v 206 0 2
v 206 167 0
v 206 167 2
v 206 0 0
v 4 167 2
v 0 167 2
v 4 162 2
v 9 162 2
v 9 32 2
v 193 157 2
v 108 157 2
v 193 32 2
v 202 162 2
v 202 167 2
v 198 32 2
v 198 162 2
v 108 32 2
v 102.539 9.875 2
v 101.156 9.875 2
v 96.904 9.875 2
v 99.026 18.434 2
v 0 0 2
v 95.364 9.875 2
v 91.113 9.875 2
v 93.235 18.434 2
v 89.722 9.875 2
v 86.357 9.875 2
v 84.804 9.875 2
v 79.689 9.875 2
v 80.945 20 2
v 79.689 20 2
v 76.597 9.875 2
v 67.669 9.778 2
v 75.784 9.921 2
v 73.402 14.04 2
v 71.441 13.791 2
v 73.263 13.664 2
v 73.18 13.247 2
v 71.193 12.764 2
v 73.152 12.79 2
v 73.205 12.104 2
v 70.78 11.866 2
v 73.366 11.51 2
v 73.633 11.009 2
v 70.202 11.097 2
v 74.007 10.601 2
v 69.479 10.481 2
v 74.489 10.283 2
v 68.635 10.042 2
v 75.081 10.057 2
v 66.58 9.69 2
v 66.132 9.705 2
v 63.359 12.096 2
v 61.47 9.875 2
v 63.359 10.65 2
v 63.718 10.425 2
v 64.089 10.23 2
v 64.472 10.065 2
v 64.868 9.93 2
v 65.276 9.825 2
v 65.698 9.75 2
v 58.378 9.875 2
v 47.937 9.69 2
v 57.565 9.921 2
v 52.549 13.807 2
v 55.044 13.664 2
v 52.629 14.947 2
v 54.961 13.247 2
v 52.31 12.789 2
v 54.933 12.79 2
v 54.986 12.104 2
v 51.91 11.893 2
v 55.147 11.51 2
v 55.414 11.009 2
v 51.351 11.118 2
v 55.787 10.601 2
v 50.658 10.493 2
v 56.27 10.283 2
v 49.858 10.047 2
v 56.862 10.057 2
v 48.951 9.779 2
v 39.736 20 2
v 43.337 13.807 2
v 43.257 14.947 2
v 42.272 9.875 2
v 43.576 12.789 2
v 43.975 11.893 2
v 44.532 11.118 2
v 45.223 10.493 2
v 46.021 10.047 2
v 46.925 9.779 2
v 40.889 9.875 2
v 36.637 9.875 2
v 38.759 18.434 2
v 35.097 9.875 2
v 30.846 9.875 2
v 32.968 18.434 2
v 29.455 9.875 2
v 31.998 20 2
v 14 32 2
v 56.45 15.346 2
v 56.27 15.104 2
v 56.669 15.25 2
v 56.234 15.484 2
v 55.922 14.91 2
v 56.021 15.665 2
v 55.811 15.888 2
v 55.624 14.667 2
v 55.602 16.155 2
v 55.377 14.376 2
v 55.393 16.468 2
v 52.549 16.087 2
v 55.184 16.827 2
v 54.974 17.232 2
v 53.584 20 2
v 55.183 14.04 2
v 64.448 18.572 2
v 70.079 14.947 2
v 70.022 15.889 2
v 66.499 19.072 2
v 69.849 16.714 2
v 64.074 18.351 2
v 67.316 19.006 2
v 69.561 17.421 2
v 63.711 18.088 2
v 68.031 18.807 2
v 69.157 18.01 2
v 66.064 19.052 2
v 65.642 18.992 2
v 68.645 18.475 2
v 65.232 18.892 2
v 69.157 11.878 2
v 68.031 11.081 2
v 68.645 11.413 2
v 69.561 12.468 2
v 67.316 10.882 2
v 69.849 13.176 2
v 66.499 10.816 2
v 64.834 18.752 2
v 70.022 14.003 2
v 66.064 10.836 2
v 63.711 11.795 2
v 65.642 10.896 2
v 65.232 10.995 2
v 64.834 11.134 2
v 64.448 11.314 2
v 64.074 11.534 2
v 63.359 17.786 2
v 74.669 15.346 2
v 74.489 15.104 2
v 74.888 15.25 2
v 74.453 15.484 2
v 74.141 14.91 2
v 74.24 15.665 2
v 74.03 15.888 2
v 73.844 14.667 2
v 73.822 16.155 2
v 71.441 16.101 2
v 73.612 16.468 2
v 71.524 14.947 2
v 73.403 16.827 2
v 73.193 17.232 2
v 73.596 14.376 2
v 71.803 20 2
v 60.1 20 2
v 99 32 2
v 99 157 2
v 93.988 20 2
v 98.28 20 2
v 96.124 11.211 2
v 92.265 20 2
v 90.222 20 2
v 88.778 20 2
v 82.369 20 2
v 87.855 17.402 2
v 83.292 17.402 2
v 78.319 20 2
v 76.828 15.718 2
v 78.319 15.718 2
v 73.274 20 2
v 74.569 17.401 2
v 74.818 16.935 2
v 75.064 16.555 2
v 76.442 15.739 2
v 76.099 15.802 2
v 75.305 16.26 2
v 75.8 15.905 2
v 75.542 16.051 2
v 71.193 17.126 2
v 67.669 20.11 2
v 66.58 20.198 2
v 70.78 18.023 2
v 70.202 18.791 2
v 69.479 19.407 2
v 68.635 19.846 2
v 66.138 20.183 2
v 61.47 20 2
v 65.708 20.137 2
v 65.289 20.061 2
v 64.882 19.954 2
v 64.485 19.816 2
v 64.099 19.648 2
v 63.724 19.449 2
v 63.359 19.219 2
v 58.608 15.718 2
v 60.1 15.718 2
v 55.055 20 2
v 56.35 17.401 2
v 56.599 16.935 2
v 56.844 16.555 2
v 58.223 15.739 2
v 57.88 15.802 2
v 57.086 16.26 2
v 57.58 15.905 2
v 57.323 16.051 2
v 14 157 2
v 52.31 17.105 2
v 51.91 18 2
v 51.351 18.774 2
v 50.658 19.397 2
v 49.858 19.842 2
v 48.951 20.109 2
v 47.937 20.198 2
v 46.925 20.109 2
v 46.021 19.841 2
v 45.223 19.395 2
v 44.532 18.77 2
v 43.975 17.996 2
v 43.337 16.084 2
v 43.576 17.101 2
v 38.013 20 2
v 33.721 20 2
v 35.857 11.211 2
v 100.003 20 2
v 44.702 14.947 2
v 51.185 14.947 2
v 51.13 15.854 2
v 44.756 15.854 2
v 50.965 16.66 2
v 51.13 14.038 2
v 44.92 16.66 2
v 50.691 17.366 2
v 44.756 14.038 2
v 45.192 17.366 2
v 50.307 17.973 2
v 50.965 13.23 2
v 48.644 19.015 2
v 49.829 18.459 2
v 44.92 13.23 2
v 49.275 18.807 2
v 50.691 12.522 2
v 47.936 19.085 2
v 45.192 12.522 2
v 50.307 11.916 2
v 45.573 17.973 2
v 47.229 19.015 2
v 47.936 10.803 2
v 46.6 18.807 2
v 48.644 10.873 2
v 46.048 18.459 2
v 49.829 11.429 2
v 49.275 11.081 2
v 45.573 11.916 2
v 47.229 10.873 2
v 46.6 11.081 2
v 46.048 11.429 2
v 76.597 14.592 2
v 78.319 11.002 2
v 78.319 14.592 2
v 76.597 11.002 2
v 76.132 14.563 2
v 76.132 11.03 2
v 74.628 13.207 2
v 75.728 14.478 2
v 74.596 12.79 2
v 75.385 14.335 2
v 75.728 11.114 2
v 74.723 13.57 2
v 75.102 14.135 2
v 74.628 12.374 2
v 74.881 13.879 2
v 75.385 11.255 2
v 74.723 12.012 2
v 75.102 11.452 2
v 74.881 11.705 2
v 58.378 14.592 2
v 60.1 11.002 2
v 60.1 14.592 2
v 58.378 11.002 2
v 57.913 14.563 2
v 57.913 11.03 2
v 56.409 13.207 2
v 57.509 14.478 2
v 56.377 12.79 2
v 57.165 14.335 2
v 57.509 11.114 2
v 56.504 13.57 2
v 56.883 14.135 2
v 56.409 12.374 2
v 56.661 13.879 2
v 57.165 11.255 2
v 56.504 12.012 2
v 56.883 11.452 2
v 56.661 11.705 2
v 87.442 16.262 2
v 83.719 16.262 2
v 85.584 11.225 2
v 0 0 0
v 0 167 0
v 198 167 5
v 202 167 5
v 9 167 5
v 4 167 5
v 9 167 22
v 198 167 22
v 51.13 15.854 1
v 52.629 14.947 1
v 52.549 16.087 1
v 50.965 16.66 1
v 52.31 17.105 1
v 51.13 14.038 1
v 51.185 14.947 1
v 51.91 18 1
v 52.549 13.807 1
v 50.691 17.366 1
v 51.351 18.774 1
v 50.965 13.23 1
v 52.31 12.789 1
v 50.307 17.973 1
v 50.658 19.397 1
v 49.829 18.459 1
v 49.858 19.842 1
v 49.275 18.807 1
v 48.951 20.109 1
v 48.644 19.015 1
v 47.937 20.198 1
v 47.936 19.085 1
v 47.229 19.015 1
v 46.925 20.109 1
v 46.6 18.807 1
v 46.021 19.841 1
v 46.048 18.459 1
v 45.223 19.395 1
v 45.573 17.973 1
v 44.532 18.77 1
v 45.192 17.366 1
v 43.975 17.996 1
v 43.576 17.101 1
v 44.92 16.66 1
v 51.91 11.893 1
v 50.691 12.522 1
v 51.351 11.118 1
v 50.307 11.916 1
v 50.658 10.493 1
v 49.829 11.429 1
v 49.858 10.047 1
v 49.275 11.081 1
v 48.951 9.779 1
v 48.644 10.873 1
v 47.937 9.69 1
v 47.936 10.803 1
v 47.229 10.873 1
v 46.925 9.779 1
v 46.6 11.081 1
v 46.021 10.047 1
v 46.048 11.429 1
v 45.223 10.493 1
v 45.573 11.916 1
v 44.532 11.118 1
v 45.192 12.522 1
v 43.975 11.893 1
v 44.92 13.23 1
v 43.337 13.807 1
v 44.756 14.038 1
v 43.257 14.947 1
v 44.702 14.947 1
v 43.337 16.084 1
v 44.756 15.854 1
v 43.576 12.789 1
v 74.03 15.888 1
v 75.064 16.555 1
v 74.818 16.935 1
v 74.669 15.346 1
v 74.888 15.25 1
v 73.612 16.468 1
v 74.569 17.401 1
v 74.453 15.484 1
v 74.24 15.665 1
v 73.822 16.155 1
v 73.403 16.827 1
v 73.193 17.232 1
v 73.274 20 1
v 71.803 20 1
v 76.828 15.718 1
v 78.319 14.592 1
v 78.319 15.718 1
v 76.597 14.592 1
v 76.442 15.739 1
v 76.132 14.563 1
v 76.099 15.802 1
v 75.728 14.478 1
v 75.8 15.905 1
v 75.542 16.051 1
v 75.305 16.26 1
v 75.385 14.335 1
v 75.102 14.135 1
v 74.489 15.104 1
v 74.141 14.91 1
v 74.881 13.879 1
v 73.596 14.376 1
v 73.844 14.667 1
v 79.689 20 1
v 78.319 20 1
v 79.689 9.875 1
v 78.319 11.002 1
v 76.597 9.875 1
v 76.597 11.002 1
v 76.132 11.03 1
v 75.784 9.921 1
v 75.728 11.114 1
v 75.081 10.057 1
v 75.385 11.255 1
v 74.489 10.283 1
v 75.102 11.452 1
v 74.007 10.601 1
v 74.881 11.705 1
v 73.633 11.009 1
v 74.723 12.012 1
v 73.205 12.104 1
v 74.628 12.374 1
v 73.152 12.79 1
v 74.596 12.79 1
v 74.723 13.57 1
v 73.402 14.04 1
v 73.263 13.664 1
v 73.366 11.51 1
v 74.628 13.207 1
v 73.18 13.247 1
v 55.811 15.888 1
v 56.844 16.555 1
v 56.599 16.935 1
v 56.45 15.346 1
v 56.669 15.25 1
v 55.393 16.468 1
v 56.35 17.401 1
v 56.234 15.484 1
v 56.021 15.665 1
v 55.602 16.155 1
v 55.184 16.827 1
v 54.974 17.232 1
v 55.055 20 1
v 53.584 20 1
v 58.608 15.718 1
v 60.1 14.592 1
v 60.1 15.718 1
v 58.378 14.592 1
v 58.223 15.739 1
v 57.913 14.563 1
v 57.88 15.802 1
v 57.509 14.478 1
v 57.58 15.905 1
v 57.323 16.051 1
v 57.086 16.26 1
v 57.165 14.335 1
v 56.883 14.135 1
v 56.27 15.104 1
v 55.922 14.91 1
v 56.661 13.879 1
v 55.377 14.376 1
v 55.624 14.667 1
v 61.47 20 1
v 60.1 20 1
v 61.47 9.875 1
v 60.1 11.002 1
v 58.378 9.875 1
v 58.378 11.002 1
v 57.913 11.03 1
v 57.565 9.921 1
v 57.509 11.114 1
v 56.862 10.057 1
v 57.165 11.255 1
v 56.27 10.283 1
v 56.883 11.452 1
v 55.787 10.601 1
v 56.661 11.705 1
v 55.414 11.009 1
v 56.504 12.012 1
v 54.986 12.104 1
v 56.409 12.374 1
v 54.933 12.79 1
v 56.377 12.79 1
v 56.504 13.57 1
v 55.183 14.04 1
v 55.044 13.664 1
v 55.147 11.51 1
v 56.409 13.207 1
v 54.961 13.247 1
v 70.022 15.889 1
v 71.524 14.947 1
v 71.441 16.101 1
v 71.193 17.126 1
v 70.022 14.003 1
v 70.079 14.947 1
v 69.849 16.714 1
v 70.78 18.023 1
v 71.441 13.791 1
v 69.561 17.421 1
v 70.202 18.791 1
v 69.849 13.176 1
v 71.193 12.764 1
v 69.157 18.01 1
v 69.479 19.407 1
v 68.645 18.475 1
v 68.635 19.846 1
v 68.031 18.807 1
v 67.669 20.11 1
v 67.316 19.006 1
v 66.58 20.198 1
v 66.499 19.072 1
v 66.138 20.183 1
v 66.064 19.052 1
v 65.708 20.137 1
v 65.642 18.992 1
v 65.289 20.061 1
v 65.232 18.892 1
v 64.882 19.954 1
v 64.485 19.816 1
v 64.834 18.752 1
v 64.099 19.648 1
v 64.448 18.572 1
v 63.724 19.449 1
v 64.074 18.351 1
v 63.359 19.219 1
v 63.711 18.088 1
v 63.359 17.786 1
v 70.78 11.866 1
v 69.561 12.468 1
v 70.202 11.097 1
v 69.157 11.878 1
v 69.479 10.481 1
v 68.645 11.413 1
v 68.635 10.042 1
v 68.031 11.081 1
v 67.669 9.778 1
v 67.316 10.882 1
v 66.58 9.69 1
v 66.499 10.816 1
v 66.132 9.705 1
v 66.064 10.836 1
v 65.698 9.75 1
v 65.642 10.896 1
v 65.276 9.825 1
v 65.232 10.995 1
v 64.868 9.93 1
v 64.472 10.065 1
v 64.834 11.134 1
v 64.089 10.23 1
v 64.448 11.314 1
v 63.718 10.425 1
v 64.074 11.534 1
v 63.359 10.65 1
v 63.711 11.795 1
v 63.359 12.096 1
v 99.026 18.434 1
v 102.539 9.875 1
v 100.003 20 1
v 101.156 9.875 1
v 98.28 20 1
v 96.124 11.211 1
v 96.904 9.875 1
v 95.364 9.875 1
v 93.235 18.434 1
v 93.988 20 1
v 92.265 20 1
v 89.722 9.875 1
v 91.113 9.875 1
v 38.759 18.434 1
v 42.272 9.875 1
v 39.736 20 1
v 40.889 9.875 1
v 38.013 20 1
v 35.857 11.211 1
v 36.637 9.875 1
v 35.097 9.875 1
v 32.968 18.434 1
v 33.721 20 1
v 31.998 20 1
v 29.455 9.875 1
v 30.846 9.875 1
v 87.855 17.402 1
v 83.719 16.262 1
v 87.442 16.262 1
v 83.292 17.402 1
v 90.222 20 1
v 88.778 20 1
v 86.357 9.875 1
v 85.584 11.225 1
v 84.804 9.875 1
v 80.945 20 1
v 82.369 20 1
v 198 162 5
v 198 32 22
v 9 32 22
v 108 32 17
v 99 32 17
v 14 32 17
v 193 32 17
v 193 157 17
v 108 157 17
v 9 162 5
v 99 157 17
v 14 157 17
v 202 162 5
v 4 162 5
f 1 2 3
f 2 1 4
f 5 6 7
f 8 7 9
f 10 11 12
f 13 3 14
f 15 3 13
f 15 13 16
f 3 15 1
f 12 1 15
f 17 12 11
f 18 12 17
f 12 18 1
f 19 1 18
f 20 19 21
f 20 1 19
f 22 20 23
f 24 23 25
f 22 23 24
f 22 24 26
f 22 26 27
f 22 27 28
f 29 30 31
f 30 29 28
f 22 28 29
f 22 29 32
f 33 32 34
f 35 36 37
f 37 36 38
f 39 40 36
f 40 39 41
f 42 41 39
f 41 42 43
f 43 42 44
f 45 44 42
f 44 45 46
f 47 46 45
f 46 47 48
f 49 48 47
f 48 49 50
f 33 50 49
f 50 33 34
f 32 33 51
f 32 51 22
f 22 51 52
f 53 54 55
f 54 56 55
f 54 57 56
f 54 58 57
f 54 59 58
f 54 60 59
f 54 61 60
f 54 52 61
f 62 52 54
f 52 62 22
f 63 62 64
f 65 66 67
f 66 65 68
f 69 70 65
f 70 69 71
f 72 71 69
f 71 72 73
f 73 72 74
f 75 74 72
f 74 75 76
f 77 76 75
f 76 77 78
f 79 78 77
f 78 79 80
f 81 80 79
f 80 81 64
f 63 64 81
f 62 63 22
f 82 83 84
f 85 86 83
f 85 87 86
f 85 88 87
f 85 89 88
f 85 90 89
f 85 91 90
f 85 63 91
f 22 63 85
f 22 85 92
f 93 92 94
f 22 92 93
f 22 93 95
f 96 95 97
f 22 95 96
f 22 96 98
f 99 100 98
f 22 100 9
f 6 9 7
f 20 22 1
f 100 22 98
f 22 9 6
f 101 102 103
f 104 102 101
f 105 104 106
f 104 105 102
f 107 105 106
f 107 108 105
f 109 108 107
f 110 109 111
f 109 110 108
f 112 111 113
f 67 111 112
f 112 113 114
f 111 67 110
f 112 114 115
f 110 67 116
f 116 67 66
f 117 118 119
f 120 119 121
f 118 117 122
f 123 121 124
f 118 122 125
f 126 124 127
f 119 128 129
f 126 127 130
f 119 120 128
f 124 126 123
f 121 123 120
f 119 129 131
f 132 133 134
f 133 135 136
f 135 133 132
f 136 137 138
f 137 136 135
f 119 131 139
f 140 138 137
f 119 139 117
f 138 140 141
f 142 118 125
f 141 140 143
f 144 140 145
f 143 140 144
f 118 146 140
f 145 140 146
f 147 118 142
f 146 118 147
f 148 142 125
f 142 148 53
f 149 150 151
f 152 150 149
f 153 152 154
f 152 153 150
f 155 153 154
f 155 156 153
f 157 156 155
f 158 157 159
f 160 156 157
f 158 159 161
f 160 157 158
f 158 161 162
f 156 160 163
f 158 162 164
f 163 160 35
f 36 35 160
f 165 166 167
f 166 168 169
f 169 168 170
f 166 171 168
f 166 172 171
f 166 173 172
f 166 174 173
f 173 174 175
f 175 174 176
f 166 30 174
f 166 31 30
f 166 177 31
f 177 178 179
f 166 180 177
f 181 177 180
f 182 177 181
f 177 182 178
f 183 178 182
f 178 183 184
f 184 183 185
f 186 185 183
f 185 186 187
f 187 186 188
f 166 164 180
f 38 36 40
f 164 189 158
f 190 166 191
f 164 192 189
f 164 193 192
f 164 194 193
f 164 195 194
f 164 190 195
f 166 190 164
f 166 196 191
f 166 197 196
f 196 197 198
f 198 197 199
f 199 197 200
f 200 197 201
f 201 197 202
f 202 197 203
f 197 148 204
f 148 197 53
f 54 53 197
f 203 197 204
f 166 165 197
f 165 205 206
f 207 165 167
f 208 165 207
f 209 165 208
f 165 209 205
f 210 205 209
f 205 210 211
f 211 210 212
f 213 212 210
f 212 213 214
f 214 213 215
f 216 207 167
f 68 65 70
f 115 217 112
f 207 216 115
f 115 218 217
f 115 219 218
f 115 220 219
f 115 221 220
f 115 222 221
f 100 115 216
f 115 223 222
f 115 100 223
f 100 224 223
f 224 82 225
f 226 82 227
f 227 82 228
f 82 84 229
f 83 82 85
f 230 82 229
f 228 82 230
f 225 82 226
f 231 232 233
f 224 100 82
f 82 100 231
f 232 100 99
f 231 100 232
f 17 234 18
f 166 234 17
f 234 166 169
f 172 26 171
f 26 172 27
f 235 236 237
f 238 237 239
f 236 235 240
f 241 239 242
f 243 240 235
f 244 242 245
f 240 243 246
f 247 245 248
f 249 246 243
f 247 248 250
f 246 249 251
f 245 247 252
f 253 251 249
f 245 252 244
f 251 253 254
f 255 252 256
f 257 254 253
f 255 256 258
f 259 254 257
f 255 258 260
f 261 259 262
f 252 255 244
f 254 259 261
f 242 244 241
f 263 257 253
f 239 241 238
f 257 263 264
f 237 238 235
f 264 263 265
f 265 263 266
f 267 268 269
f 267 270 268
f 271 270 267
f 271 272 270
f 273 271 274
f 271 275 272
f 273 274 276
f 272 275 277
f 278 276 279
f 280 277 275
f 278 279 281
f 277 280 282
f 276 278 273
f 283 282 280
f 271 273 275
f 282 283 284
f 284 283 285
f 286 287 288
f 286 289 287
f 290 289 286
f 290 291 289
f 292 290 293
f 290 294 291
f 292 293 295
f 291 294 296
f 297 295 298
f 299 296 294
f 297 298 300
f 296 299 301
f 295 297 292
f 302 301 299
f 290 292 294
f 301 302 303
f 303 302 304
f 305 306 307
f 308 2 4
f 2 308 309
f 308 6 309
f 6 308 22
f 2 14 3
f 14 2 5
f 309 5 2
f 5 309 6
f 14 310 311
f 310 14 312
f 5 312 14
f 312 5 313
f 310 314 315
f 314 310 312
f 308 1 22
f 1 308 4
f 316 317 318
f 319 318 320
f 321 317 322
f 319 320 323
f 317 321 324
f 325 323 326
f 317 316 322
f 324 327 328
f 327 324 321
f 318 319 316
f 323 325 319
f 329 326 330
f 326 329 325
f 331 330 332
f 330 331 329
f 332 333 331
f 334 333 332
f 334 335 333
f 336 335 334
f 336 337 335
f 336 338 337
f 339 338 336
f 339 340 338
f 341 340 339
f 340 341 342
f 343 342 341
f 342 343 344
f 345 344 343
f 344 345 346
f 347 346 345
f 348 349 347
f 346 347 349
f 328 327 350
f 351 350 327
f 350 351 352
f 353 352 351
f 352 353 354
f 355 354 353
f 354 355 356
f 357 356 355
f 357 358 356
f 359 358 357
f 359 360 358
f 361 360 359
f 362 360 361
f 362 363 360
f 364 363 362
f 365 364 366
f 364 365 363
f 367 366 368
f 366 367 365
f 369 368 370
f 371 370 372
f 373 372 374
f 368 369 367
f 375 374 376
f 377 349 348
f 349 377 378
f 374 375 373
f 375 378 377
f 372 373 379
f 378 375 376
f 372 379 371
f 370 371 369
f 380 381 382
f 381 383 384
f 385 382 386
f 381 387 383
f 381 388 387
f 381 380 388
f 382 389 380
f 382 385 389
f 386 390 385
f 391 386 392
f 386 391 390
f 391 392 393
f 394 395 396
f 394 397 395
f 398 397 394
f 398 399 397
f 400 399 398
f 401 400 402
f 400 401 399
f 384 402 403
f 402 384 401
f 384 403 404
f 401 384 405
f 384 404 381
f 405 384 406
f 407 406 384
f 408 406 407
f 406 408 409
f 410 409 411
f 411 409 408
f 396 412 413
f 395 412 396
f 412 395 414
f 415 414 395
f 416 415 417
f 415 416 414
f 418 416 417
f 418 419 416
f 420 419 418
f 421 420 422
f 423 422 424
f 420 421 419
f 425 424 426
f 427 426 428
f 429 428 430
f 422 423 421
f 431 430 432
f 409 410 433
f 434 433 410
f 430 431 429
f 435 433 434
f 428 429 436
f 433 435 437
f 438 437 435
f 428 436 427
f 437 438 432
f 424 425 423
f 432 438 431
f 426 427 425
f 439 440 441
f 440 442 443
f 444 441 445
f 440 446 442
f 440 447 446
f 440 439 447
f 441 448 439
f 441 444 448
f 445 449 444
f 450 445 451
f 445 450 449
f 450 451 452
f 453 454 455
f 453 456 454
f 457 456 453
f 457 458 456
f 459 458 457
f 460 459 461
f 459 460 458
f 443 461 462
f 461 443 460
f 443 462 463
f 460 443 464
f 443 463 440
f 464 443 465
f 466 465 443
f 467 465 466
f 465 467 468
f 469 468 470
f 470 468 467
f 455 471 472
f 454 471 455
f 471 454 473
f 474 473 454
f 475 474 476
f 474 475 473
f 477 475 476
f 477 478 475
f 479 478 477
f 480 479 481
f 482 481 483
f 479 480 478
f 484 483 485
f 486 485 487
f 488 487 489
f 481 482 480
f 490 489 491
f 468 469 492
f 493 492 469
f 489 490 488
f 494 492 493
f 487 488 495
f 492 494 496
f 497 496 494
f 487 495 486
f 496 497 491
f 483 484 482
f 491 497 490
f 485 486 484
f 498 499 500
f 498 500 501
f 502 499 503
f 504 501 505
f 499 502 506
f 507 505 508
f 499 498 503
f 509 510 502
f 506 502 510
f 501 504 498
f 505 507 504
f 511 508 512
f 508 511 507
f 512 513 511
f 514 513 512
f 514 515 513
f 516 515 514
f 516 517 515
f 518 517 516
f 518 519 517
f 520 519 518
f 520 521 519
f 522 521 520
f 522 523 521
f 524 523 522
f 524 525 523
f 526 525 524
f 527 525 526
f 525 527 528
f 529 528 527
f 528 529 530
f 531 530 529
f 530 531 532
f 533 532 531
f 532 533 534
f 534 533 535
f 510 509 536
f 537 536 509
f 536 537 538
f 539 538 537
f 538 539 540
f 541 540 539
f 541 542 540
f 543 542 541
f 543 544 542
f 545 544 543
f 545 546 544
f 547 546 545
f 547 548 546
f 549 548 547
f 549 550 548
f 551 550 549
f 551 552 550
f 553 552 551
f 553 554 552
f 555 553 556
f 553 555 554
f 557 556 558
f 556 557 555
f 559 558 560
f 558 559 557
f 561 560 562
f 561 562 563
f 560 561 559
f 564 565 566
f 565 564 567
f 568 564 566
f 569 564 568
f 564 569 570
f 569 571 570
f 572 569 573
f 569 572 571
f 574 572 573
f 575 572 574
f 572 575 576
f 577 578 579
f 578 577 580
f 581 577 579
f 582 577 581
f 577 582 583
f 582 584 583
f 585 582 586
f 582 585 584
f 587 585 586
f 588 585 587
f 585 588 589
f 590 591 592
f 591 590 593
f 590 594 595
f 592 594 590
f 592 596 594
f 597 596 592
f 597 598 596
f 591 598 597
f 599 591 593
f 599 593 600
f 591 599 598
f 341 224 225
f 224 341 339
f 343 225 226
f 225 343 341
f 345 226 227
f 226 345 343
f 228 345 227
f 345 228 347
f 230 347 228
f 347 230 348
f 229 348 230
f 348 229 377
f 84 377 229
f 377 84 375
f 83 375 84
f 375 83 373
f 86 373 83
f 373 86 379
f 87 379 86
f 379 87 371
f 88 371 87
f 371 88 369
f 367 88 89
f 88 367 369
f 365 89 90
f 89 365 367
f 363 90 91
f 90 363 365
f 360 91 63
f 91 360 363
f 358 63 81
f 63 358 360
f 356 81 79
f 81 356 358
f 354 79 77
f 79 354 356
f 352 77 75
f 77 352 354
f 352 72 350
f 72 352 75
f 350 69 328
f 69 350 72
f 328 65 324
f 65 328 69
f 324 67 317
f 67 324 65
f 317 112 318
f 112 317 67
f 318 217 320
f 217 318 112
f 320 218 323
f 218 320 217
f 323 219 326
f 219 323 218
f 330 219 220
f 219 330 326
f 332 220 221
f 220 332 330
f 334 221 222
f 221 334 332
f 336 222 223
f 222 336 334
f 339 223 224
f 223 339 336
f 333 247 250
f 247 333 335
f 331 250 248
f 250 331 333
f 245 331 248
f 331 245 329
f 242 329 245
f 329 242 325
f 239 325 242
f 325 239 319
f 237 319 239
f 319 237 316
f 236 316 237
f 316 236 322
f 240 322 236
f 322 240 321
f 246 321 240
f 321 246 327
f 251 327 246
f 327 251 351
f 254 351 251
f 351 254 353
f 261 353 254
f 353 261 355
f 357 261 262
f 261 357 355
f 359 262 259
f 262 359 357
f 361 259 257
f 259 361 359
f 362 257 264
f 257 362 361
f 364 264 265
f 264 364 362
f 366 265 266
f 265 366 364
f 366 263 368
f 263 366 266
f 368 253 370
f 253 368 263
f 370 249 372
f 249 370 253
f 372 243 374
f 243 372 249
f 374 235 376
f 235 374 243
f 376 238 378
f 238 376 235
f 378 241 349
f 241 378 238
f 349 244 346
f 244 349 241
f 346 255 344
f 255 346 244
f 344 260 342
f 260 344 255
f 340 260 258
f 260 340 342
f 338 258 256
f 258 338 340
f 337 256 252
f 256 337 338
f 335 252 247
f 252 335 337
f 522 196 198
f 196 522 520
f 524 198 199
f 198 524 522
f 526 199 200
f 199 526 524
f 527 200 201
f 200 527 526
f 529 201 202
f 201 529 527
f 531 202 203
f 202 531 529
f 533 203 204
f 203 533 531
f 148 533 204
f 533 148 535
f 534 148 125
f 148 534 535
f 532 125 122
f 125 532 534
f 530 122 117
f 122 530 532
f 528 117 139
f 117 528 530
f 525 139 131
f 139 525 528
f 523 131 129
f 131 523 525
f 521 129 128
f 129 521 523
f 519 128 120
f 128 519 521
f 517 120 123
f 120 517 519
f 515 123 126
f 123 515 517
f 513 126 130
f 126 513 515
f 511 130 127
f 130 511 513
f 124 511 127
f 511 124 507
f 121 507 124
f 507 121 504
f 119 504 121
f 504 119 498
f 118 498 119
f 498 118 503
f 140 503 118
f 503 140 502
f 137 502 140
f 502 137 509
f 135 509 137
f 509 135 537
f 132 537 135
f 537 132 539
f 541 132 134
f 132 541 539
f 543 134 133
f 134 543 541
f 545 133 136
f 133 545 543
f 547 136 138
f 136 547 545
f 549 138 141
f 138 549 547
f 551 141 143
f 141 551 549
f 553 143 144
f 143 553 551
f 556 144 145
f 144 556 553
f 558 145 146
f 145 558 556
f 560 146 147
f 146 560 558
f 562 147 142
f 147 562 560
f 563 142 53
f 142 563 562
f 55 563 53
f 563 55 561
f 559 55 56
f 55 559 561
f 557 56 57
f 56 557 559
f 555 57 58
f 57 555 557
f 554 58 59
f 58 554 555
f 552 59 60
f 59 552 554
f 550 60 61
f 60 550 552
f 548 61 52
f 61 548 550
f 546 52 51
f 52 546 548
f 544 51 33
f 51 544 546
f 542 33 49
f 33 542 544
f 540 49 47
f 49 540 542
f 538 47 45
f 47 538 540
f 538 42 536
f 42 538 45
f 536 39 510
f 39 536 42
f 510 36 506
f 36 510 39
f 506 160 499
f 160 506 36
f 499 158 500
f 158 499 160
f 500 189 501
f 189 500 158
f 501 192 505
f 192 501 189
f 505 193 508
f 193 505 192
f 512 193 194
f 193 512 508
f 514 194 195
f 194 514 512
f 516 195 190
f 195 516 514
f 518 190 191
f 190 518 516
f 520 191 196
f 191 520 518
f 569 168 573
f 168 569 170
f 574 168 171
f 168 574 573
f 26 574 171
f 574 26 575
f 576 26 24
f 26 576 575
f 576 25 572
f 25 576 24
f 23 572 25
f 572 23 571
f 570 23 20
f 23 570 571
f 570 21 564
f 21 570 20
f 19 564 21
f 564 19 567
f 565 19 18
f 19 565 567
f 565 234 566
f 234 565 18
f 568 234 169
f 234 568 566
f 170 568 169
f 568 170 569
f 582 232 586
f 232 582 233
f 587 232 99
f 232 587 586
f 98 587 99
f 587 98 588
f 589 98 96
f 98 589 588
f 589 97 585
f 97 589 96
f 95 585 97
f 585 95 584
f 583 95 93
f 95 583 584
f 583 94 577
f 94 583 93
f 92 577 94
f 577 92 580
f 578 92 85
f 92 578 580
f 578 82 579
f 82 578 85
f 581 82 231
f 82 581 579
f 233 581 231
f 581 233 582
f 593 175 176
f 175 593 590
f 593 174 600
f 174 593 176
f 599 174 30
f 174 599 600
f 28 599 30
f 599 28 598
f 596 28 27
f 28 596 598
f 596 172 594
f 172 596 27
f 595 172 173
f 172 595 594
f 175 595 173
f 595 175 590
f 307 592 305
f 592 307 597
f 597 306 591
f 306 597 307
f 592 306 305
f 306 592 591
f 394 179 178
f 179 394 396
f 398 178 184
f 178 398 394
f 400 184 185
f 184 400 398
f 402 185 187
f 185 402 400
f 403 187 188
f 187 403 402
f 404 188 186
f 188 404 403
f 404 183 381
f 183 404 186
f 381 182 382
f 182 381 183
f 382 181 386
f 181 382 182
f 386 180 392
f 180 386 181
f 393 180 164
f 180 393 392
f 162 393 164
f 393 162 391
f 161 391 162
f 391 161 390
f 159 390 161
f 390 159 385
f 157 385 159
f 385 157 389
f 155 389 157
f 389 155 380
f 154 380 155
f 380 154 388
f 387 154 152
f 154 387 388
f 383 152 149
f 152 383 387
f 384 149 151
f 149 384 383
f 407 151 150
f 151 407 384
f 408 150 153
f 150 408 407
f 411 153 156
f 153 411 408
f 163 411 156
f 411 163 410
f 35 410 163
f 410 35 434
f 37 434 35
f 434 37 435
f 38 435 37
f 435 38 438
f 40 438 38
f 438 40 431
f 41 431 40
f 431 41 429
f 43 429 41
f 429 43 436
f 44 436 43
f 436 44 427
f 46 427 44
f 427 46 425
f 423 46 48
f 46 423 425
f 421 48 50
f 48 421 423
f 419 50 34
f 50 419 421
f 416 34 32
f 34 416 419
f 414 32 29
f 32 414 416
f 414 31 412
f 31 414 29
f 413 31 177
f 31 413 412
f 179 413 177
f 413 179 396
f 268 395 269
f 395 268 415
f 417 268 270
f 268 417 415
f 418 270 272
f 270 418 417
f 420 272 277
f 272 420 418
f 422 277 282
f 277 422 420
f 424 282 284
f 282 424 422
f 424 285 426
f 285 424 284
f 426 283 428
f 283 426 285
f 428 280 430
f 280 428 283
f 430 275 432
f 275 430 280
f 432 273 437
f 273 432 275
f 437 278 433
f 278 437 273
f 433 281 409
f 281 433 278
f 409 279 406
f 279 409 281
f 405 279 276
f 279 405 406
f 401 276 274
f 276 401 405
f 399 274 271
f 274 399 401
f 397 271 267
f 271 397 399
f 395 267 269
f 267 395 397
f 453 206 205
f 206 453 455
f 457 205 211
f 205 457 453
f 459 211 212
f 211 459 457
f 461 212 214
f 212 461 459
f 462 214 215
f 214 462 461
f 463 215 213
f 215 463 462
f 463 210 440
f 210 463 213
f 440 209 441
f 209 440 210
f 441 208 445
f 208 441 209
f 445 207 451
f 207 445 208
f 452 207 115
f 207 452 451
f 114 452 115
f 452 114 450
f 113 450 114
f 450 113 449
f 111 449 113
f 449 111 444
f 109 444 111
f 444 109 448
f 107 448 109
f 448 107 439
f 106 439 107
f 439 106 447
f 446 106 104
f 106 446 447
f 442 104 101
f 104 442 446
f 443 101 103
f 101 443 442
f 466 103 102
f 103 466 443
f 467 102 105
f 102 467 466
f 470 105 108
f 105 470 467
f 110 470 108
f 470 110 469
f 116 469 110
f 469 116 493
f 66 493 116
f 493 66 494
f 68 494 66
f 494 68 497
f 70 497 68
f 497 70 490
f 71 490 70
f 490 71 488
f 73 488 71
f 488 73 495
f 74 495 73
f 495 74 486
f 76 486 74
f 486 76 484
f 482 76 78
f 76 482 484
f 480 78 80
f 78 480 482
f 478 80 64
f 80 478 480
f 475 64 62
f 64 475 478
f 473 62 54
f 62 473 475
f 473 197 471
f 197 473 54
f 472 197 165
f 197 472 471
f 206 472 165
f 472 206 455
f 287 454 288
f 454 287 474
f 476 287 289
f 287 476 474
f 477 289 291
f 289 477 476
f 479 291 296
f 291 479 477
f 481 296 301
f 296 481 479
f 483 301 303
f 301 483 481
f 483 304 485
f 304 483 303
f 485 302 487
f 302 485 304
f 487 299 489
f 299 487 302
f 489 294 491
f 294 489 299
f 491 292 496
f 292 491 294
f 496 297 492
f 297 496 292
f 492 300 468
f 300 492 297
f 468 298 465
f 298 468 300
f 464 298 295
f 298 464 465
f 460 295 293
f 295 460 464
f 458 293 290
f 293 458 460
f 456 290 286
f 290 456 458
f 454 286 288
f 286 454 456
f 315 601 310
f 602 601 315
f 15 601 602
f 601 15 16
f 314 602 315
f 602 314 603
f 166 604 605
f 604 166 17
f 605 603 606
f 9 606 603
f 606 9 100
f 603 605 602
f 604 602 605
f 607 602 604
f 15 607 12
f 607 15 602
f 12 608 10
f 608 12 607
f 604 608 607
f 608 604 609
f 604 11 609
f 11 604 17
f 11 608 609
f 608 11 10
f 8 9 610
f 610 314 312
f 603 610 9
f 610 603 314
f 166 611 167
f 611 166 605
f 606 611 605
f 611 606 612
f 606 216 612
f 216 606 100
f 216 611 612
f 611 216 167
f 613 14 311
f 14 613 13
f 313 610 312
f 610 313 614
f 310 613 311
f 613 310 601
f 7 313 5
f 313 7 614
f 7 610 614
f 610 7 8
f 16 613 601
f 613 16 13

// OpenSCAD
//$fn=360;
//67x93x22
//cards = 85x125x10
x=206;
y=167;
z=2;
cardx=85;
cardy=125;
cardz=15;
difference() {
  translate([0,0,0])
  cube([x,y,z]);
  translate ([x/2,20,1])
  linear_extrude(1)
  rotate([0,0,180])
  text ("WARCROW",font="Helvetica LT MM");
}
//handle
translate([4,y-5,z])
cube([x-8,5,z+1]);
//cards slots
for ( xbase = [103,197] ) {
  difference() {
    translate([x-xbase,y-135,z])
    cube([cardx+10,cardy+10,cardz+5]);
    translate([x-xbase+5,y-145,z])
    cube([cardx,cardy+10,cardz]);
  }
}
